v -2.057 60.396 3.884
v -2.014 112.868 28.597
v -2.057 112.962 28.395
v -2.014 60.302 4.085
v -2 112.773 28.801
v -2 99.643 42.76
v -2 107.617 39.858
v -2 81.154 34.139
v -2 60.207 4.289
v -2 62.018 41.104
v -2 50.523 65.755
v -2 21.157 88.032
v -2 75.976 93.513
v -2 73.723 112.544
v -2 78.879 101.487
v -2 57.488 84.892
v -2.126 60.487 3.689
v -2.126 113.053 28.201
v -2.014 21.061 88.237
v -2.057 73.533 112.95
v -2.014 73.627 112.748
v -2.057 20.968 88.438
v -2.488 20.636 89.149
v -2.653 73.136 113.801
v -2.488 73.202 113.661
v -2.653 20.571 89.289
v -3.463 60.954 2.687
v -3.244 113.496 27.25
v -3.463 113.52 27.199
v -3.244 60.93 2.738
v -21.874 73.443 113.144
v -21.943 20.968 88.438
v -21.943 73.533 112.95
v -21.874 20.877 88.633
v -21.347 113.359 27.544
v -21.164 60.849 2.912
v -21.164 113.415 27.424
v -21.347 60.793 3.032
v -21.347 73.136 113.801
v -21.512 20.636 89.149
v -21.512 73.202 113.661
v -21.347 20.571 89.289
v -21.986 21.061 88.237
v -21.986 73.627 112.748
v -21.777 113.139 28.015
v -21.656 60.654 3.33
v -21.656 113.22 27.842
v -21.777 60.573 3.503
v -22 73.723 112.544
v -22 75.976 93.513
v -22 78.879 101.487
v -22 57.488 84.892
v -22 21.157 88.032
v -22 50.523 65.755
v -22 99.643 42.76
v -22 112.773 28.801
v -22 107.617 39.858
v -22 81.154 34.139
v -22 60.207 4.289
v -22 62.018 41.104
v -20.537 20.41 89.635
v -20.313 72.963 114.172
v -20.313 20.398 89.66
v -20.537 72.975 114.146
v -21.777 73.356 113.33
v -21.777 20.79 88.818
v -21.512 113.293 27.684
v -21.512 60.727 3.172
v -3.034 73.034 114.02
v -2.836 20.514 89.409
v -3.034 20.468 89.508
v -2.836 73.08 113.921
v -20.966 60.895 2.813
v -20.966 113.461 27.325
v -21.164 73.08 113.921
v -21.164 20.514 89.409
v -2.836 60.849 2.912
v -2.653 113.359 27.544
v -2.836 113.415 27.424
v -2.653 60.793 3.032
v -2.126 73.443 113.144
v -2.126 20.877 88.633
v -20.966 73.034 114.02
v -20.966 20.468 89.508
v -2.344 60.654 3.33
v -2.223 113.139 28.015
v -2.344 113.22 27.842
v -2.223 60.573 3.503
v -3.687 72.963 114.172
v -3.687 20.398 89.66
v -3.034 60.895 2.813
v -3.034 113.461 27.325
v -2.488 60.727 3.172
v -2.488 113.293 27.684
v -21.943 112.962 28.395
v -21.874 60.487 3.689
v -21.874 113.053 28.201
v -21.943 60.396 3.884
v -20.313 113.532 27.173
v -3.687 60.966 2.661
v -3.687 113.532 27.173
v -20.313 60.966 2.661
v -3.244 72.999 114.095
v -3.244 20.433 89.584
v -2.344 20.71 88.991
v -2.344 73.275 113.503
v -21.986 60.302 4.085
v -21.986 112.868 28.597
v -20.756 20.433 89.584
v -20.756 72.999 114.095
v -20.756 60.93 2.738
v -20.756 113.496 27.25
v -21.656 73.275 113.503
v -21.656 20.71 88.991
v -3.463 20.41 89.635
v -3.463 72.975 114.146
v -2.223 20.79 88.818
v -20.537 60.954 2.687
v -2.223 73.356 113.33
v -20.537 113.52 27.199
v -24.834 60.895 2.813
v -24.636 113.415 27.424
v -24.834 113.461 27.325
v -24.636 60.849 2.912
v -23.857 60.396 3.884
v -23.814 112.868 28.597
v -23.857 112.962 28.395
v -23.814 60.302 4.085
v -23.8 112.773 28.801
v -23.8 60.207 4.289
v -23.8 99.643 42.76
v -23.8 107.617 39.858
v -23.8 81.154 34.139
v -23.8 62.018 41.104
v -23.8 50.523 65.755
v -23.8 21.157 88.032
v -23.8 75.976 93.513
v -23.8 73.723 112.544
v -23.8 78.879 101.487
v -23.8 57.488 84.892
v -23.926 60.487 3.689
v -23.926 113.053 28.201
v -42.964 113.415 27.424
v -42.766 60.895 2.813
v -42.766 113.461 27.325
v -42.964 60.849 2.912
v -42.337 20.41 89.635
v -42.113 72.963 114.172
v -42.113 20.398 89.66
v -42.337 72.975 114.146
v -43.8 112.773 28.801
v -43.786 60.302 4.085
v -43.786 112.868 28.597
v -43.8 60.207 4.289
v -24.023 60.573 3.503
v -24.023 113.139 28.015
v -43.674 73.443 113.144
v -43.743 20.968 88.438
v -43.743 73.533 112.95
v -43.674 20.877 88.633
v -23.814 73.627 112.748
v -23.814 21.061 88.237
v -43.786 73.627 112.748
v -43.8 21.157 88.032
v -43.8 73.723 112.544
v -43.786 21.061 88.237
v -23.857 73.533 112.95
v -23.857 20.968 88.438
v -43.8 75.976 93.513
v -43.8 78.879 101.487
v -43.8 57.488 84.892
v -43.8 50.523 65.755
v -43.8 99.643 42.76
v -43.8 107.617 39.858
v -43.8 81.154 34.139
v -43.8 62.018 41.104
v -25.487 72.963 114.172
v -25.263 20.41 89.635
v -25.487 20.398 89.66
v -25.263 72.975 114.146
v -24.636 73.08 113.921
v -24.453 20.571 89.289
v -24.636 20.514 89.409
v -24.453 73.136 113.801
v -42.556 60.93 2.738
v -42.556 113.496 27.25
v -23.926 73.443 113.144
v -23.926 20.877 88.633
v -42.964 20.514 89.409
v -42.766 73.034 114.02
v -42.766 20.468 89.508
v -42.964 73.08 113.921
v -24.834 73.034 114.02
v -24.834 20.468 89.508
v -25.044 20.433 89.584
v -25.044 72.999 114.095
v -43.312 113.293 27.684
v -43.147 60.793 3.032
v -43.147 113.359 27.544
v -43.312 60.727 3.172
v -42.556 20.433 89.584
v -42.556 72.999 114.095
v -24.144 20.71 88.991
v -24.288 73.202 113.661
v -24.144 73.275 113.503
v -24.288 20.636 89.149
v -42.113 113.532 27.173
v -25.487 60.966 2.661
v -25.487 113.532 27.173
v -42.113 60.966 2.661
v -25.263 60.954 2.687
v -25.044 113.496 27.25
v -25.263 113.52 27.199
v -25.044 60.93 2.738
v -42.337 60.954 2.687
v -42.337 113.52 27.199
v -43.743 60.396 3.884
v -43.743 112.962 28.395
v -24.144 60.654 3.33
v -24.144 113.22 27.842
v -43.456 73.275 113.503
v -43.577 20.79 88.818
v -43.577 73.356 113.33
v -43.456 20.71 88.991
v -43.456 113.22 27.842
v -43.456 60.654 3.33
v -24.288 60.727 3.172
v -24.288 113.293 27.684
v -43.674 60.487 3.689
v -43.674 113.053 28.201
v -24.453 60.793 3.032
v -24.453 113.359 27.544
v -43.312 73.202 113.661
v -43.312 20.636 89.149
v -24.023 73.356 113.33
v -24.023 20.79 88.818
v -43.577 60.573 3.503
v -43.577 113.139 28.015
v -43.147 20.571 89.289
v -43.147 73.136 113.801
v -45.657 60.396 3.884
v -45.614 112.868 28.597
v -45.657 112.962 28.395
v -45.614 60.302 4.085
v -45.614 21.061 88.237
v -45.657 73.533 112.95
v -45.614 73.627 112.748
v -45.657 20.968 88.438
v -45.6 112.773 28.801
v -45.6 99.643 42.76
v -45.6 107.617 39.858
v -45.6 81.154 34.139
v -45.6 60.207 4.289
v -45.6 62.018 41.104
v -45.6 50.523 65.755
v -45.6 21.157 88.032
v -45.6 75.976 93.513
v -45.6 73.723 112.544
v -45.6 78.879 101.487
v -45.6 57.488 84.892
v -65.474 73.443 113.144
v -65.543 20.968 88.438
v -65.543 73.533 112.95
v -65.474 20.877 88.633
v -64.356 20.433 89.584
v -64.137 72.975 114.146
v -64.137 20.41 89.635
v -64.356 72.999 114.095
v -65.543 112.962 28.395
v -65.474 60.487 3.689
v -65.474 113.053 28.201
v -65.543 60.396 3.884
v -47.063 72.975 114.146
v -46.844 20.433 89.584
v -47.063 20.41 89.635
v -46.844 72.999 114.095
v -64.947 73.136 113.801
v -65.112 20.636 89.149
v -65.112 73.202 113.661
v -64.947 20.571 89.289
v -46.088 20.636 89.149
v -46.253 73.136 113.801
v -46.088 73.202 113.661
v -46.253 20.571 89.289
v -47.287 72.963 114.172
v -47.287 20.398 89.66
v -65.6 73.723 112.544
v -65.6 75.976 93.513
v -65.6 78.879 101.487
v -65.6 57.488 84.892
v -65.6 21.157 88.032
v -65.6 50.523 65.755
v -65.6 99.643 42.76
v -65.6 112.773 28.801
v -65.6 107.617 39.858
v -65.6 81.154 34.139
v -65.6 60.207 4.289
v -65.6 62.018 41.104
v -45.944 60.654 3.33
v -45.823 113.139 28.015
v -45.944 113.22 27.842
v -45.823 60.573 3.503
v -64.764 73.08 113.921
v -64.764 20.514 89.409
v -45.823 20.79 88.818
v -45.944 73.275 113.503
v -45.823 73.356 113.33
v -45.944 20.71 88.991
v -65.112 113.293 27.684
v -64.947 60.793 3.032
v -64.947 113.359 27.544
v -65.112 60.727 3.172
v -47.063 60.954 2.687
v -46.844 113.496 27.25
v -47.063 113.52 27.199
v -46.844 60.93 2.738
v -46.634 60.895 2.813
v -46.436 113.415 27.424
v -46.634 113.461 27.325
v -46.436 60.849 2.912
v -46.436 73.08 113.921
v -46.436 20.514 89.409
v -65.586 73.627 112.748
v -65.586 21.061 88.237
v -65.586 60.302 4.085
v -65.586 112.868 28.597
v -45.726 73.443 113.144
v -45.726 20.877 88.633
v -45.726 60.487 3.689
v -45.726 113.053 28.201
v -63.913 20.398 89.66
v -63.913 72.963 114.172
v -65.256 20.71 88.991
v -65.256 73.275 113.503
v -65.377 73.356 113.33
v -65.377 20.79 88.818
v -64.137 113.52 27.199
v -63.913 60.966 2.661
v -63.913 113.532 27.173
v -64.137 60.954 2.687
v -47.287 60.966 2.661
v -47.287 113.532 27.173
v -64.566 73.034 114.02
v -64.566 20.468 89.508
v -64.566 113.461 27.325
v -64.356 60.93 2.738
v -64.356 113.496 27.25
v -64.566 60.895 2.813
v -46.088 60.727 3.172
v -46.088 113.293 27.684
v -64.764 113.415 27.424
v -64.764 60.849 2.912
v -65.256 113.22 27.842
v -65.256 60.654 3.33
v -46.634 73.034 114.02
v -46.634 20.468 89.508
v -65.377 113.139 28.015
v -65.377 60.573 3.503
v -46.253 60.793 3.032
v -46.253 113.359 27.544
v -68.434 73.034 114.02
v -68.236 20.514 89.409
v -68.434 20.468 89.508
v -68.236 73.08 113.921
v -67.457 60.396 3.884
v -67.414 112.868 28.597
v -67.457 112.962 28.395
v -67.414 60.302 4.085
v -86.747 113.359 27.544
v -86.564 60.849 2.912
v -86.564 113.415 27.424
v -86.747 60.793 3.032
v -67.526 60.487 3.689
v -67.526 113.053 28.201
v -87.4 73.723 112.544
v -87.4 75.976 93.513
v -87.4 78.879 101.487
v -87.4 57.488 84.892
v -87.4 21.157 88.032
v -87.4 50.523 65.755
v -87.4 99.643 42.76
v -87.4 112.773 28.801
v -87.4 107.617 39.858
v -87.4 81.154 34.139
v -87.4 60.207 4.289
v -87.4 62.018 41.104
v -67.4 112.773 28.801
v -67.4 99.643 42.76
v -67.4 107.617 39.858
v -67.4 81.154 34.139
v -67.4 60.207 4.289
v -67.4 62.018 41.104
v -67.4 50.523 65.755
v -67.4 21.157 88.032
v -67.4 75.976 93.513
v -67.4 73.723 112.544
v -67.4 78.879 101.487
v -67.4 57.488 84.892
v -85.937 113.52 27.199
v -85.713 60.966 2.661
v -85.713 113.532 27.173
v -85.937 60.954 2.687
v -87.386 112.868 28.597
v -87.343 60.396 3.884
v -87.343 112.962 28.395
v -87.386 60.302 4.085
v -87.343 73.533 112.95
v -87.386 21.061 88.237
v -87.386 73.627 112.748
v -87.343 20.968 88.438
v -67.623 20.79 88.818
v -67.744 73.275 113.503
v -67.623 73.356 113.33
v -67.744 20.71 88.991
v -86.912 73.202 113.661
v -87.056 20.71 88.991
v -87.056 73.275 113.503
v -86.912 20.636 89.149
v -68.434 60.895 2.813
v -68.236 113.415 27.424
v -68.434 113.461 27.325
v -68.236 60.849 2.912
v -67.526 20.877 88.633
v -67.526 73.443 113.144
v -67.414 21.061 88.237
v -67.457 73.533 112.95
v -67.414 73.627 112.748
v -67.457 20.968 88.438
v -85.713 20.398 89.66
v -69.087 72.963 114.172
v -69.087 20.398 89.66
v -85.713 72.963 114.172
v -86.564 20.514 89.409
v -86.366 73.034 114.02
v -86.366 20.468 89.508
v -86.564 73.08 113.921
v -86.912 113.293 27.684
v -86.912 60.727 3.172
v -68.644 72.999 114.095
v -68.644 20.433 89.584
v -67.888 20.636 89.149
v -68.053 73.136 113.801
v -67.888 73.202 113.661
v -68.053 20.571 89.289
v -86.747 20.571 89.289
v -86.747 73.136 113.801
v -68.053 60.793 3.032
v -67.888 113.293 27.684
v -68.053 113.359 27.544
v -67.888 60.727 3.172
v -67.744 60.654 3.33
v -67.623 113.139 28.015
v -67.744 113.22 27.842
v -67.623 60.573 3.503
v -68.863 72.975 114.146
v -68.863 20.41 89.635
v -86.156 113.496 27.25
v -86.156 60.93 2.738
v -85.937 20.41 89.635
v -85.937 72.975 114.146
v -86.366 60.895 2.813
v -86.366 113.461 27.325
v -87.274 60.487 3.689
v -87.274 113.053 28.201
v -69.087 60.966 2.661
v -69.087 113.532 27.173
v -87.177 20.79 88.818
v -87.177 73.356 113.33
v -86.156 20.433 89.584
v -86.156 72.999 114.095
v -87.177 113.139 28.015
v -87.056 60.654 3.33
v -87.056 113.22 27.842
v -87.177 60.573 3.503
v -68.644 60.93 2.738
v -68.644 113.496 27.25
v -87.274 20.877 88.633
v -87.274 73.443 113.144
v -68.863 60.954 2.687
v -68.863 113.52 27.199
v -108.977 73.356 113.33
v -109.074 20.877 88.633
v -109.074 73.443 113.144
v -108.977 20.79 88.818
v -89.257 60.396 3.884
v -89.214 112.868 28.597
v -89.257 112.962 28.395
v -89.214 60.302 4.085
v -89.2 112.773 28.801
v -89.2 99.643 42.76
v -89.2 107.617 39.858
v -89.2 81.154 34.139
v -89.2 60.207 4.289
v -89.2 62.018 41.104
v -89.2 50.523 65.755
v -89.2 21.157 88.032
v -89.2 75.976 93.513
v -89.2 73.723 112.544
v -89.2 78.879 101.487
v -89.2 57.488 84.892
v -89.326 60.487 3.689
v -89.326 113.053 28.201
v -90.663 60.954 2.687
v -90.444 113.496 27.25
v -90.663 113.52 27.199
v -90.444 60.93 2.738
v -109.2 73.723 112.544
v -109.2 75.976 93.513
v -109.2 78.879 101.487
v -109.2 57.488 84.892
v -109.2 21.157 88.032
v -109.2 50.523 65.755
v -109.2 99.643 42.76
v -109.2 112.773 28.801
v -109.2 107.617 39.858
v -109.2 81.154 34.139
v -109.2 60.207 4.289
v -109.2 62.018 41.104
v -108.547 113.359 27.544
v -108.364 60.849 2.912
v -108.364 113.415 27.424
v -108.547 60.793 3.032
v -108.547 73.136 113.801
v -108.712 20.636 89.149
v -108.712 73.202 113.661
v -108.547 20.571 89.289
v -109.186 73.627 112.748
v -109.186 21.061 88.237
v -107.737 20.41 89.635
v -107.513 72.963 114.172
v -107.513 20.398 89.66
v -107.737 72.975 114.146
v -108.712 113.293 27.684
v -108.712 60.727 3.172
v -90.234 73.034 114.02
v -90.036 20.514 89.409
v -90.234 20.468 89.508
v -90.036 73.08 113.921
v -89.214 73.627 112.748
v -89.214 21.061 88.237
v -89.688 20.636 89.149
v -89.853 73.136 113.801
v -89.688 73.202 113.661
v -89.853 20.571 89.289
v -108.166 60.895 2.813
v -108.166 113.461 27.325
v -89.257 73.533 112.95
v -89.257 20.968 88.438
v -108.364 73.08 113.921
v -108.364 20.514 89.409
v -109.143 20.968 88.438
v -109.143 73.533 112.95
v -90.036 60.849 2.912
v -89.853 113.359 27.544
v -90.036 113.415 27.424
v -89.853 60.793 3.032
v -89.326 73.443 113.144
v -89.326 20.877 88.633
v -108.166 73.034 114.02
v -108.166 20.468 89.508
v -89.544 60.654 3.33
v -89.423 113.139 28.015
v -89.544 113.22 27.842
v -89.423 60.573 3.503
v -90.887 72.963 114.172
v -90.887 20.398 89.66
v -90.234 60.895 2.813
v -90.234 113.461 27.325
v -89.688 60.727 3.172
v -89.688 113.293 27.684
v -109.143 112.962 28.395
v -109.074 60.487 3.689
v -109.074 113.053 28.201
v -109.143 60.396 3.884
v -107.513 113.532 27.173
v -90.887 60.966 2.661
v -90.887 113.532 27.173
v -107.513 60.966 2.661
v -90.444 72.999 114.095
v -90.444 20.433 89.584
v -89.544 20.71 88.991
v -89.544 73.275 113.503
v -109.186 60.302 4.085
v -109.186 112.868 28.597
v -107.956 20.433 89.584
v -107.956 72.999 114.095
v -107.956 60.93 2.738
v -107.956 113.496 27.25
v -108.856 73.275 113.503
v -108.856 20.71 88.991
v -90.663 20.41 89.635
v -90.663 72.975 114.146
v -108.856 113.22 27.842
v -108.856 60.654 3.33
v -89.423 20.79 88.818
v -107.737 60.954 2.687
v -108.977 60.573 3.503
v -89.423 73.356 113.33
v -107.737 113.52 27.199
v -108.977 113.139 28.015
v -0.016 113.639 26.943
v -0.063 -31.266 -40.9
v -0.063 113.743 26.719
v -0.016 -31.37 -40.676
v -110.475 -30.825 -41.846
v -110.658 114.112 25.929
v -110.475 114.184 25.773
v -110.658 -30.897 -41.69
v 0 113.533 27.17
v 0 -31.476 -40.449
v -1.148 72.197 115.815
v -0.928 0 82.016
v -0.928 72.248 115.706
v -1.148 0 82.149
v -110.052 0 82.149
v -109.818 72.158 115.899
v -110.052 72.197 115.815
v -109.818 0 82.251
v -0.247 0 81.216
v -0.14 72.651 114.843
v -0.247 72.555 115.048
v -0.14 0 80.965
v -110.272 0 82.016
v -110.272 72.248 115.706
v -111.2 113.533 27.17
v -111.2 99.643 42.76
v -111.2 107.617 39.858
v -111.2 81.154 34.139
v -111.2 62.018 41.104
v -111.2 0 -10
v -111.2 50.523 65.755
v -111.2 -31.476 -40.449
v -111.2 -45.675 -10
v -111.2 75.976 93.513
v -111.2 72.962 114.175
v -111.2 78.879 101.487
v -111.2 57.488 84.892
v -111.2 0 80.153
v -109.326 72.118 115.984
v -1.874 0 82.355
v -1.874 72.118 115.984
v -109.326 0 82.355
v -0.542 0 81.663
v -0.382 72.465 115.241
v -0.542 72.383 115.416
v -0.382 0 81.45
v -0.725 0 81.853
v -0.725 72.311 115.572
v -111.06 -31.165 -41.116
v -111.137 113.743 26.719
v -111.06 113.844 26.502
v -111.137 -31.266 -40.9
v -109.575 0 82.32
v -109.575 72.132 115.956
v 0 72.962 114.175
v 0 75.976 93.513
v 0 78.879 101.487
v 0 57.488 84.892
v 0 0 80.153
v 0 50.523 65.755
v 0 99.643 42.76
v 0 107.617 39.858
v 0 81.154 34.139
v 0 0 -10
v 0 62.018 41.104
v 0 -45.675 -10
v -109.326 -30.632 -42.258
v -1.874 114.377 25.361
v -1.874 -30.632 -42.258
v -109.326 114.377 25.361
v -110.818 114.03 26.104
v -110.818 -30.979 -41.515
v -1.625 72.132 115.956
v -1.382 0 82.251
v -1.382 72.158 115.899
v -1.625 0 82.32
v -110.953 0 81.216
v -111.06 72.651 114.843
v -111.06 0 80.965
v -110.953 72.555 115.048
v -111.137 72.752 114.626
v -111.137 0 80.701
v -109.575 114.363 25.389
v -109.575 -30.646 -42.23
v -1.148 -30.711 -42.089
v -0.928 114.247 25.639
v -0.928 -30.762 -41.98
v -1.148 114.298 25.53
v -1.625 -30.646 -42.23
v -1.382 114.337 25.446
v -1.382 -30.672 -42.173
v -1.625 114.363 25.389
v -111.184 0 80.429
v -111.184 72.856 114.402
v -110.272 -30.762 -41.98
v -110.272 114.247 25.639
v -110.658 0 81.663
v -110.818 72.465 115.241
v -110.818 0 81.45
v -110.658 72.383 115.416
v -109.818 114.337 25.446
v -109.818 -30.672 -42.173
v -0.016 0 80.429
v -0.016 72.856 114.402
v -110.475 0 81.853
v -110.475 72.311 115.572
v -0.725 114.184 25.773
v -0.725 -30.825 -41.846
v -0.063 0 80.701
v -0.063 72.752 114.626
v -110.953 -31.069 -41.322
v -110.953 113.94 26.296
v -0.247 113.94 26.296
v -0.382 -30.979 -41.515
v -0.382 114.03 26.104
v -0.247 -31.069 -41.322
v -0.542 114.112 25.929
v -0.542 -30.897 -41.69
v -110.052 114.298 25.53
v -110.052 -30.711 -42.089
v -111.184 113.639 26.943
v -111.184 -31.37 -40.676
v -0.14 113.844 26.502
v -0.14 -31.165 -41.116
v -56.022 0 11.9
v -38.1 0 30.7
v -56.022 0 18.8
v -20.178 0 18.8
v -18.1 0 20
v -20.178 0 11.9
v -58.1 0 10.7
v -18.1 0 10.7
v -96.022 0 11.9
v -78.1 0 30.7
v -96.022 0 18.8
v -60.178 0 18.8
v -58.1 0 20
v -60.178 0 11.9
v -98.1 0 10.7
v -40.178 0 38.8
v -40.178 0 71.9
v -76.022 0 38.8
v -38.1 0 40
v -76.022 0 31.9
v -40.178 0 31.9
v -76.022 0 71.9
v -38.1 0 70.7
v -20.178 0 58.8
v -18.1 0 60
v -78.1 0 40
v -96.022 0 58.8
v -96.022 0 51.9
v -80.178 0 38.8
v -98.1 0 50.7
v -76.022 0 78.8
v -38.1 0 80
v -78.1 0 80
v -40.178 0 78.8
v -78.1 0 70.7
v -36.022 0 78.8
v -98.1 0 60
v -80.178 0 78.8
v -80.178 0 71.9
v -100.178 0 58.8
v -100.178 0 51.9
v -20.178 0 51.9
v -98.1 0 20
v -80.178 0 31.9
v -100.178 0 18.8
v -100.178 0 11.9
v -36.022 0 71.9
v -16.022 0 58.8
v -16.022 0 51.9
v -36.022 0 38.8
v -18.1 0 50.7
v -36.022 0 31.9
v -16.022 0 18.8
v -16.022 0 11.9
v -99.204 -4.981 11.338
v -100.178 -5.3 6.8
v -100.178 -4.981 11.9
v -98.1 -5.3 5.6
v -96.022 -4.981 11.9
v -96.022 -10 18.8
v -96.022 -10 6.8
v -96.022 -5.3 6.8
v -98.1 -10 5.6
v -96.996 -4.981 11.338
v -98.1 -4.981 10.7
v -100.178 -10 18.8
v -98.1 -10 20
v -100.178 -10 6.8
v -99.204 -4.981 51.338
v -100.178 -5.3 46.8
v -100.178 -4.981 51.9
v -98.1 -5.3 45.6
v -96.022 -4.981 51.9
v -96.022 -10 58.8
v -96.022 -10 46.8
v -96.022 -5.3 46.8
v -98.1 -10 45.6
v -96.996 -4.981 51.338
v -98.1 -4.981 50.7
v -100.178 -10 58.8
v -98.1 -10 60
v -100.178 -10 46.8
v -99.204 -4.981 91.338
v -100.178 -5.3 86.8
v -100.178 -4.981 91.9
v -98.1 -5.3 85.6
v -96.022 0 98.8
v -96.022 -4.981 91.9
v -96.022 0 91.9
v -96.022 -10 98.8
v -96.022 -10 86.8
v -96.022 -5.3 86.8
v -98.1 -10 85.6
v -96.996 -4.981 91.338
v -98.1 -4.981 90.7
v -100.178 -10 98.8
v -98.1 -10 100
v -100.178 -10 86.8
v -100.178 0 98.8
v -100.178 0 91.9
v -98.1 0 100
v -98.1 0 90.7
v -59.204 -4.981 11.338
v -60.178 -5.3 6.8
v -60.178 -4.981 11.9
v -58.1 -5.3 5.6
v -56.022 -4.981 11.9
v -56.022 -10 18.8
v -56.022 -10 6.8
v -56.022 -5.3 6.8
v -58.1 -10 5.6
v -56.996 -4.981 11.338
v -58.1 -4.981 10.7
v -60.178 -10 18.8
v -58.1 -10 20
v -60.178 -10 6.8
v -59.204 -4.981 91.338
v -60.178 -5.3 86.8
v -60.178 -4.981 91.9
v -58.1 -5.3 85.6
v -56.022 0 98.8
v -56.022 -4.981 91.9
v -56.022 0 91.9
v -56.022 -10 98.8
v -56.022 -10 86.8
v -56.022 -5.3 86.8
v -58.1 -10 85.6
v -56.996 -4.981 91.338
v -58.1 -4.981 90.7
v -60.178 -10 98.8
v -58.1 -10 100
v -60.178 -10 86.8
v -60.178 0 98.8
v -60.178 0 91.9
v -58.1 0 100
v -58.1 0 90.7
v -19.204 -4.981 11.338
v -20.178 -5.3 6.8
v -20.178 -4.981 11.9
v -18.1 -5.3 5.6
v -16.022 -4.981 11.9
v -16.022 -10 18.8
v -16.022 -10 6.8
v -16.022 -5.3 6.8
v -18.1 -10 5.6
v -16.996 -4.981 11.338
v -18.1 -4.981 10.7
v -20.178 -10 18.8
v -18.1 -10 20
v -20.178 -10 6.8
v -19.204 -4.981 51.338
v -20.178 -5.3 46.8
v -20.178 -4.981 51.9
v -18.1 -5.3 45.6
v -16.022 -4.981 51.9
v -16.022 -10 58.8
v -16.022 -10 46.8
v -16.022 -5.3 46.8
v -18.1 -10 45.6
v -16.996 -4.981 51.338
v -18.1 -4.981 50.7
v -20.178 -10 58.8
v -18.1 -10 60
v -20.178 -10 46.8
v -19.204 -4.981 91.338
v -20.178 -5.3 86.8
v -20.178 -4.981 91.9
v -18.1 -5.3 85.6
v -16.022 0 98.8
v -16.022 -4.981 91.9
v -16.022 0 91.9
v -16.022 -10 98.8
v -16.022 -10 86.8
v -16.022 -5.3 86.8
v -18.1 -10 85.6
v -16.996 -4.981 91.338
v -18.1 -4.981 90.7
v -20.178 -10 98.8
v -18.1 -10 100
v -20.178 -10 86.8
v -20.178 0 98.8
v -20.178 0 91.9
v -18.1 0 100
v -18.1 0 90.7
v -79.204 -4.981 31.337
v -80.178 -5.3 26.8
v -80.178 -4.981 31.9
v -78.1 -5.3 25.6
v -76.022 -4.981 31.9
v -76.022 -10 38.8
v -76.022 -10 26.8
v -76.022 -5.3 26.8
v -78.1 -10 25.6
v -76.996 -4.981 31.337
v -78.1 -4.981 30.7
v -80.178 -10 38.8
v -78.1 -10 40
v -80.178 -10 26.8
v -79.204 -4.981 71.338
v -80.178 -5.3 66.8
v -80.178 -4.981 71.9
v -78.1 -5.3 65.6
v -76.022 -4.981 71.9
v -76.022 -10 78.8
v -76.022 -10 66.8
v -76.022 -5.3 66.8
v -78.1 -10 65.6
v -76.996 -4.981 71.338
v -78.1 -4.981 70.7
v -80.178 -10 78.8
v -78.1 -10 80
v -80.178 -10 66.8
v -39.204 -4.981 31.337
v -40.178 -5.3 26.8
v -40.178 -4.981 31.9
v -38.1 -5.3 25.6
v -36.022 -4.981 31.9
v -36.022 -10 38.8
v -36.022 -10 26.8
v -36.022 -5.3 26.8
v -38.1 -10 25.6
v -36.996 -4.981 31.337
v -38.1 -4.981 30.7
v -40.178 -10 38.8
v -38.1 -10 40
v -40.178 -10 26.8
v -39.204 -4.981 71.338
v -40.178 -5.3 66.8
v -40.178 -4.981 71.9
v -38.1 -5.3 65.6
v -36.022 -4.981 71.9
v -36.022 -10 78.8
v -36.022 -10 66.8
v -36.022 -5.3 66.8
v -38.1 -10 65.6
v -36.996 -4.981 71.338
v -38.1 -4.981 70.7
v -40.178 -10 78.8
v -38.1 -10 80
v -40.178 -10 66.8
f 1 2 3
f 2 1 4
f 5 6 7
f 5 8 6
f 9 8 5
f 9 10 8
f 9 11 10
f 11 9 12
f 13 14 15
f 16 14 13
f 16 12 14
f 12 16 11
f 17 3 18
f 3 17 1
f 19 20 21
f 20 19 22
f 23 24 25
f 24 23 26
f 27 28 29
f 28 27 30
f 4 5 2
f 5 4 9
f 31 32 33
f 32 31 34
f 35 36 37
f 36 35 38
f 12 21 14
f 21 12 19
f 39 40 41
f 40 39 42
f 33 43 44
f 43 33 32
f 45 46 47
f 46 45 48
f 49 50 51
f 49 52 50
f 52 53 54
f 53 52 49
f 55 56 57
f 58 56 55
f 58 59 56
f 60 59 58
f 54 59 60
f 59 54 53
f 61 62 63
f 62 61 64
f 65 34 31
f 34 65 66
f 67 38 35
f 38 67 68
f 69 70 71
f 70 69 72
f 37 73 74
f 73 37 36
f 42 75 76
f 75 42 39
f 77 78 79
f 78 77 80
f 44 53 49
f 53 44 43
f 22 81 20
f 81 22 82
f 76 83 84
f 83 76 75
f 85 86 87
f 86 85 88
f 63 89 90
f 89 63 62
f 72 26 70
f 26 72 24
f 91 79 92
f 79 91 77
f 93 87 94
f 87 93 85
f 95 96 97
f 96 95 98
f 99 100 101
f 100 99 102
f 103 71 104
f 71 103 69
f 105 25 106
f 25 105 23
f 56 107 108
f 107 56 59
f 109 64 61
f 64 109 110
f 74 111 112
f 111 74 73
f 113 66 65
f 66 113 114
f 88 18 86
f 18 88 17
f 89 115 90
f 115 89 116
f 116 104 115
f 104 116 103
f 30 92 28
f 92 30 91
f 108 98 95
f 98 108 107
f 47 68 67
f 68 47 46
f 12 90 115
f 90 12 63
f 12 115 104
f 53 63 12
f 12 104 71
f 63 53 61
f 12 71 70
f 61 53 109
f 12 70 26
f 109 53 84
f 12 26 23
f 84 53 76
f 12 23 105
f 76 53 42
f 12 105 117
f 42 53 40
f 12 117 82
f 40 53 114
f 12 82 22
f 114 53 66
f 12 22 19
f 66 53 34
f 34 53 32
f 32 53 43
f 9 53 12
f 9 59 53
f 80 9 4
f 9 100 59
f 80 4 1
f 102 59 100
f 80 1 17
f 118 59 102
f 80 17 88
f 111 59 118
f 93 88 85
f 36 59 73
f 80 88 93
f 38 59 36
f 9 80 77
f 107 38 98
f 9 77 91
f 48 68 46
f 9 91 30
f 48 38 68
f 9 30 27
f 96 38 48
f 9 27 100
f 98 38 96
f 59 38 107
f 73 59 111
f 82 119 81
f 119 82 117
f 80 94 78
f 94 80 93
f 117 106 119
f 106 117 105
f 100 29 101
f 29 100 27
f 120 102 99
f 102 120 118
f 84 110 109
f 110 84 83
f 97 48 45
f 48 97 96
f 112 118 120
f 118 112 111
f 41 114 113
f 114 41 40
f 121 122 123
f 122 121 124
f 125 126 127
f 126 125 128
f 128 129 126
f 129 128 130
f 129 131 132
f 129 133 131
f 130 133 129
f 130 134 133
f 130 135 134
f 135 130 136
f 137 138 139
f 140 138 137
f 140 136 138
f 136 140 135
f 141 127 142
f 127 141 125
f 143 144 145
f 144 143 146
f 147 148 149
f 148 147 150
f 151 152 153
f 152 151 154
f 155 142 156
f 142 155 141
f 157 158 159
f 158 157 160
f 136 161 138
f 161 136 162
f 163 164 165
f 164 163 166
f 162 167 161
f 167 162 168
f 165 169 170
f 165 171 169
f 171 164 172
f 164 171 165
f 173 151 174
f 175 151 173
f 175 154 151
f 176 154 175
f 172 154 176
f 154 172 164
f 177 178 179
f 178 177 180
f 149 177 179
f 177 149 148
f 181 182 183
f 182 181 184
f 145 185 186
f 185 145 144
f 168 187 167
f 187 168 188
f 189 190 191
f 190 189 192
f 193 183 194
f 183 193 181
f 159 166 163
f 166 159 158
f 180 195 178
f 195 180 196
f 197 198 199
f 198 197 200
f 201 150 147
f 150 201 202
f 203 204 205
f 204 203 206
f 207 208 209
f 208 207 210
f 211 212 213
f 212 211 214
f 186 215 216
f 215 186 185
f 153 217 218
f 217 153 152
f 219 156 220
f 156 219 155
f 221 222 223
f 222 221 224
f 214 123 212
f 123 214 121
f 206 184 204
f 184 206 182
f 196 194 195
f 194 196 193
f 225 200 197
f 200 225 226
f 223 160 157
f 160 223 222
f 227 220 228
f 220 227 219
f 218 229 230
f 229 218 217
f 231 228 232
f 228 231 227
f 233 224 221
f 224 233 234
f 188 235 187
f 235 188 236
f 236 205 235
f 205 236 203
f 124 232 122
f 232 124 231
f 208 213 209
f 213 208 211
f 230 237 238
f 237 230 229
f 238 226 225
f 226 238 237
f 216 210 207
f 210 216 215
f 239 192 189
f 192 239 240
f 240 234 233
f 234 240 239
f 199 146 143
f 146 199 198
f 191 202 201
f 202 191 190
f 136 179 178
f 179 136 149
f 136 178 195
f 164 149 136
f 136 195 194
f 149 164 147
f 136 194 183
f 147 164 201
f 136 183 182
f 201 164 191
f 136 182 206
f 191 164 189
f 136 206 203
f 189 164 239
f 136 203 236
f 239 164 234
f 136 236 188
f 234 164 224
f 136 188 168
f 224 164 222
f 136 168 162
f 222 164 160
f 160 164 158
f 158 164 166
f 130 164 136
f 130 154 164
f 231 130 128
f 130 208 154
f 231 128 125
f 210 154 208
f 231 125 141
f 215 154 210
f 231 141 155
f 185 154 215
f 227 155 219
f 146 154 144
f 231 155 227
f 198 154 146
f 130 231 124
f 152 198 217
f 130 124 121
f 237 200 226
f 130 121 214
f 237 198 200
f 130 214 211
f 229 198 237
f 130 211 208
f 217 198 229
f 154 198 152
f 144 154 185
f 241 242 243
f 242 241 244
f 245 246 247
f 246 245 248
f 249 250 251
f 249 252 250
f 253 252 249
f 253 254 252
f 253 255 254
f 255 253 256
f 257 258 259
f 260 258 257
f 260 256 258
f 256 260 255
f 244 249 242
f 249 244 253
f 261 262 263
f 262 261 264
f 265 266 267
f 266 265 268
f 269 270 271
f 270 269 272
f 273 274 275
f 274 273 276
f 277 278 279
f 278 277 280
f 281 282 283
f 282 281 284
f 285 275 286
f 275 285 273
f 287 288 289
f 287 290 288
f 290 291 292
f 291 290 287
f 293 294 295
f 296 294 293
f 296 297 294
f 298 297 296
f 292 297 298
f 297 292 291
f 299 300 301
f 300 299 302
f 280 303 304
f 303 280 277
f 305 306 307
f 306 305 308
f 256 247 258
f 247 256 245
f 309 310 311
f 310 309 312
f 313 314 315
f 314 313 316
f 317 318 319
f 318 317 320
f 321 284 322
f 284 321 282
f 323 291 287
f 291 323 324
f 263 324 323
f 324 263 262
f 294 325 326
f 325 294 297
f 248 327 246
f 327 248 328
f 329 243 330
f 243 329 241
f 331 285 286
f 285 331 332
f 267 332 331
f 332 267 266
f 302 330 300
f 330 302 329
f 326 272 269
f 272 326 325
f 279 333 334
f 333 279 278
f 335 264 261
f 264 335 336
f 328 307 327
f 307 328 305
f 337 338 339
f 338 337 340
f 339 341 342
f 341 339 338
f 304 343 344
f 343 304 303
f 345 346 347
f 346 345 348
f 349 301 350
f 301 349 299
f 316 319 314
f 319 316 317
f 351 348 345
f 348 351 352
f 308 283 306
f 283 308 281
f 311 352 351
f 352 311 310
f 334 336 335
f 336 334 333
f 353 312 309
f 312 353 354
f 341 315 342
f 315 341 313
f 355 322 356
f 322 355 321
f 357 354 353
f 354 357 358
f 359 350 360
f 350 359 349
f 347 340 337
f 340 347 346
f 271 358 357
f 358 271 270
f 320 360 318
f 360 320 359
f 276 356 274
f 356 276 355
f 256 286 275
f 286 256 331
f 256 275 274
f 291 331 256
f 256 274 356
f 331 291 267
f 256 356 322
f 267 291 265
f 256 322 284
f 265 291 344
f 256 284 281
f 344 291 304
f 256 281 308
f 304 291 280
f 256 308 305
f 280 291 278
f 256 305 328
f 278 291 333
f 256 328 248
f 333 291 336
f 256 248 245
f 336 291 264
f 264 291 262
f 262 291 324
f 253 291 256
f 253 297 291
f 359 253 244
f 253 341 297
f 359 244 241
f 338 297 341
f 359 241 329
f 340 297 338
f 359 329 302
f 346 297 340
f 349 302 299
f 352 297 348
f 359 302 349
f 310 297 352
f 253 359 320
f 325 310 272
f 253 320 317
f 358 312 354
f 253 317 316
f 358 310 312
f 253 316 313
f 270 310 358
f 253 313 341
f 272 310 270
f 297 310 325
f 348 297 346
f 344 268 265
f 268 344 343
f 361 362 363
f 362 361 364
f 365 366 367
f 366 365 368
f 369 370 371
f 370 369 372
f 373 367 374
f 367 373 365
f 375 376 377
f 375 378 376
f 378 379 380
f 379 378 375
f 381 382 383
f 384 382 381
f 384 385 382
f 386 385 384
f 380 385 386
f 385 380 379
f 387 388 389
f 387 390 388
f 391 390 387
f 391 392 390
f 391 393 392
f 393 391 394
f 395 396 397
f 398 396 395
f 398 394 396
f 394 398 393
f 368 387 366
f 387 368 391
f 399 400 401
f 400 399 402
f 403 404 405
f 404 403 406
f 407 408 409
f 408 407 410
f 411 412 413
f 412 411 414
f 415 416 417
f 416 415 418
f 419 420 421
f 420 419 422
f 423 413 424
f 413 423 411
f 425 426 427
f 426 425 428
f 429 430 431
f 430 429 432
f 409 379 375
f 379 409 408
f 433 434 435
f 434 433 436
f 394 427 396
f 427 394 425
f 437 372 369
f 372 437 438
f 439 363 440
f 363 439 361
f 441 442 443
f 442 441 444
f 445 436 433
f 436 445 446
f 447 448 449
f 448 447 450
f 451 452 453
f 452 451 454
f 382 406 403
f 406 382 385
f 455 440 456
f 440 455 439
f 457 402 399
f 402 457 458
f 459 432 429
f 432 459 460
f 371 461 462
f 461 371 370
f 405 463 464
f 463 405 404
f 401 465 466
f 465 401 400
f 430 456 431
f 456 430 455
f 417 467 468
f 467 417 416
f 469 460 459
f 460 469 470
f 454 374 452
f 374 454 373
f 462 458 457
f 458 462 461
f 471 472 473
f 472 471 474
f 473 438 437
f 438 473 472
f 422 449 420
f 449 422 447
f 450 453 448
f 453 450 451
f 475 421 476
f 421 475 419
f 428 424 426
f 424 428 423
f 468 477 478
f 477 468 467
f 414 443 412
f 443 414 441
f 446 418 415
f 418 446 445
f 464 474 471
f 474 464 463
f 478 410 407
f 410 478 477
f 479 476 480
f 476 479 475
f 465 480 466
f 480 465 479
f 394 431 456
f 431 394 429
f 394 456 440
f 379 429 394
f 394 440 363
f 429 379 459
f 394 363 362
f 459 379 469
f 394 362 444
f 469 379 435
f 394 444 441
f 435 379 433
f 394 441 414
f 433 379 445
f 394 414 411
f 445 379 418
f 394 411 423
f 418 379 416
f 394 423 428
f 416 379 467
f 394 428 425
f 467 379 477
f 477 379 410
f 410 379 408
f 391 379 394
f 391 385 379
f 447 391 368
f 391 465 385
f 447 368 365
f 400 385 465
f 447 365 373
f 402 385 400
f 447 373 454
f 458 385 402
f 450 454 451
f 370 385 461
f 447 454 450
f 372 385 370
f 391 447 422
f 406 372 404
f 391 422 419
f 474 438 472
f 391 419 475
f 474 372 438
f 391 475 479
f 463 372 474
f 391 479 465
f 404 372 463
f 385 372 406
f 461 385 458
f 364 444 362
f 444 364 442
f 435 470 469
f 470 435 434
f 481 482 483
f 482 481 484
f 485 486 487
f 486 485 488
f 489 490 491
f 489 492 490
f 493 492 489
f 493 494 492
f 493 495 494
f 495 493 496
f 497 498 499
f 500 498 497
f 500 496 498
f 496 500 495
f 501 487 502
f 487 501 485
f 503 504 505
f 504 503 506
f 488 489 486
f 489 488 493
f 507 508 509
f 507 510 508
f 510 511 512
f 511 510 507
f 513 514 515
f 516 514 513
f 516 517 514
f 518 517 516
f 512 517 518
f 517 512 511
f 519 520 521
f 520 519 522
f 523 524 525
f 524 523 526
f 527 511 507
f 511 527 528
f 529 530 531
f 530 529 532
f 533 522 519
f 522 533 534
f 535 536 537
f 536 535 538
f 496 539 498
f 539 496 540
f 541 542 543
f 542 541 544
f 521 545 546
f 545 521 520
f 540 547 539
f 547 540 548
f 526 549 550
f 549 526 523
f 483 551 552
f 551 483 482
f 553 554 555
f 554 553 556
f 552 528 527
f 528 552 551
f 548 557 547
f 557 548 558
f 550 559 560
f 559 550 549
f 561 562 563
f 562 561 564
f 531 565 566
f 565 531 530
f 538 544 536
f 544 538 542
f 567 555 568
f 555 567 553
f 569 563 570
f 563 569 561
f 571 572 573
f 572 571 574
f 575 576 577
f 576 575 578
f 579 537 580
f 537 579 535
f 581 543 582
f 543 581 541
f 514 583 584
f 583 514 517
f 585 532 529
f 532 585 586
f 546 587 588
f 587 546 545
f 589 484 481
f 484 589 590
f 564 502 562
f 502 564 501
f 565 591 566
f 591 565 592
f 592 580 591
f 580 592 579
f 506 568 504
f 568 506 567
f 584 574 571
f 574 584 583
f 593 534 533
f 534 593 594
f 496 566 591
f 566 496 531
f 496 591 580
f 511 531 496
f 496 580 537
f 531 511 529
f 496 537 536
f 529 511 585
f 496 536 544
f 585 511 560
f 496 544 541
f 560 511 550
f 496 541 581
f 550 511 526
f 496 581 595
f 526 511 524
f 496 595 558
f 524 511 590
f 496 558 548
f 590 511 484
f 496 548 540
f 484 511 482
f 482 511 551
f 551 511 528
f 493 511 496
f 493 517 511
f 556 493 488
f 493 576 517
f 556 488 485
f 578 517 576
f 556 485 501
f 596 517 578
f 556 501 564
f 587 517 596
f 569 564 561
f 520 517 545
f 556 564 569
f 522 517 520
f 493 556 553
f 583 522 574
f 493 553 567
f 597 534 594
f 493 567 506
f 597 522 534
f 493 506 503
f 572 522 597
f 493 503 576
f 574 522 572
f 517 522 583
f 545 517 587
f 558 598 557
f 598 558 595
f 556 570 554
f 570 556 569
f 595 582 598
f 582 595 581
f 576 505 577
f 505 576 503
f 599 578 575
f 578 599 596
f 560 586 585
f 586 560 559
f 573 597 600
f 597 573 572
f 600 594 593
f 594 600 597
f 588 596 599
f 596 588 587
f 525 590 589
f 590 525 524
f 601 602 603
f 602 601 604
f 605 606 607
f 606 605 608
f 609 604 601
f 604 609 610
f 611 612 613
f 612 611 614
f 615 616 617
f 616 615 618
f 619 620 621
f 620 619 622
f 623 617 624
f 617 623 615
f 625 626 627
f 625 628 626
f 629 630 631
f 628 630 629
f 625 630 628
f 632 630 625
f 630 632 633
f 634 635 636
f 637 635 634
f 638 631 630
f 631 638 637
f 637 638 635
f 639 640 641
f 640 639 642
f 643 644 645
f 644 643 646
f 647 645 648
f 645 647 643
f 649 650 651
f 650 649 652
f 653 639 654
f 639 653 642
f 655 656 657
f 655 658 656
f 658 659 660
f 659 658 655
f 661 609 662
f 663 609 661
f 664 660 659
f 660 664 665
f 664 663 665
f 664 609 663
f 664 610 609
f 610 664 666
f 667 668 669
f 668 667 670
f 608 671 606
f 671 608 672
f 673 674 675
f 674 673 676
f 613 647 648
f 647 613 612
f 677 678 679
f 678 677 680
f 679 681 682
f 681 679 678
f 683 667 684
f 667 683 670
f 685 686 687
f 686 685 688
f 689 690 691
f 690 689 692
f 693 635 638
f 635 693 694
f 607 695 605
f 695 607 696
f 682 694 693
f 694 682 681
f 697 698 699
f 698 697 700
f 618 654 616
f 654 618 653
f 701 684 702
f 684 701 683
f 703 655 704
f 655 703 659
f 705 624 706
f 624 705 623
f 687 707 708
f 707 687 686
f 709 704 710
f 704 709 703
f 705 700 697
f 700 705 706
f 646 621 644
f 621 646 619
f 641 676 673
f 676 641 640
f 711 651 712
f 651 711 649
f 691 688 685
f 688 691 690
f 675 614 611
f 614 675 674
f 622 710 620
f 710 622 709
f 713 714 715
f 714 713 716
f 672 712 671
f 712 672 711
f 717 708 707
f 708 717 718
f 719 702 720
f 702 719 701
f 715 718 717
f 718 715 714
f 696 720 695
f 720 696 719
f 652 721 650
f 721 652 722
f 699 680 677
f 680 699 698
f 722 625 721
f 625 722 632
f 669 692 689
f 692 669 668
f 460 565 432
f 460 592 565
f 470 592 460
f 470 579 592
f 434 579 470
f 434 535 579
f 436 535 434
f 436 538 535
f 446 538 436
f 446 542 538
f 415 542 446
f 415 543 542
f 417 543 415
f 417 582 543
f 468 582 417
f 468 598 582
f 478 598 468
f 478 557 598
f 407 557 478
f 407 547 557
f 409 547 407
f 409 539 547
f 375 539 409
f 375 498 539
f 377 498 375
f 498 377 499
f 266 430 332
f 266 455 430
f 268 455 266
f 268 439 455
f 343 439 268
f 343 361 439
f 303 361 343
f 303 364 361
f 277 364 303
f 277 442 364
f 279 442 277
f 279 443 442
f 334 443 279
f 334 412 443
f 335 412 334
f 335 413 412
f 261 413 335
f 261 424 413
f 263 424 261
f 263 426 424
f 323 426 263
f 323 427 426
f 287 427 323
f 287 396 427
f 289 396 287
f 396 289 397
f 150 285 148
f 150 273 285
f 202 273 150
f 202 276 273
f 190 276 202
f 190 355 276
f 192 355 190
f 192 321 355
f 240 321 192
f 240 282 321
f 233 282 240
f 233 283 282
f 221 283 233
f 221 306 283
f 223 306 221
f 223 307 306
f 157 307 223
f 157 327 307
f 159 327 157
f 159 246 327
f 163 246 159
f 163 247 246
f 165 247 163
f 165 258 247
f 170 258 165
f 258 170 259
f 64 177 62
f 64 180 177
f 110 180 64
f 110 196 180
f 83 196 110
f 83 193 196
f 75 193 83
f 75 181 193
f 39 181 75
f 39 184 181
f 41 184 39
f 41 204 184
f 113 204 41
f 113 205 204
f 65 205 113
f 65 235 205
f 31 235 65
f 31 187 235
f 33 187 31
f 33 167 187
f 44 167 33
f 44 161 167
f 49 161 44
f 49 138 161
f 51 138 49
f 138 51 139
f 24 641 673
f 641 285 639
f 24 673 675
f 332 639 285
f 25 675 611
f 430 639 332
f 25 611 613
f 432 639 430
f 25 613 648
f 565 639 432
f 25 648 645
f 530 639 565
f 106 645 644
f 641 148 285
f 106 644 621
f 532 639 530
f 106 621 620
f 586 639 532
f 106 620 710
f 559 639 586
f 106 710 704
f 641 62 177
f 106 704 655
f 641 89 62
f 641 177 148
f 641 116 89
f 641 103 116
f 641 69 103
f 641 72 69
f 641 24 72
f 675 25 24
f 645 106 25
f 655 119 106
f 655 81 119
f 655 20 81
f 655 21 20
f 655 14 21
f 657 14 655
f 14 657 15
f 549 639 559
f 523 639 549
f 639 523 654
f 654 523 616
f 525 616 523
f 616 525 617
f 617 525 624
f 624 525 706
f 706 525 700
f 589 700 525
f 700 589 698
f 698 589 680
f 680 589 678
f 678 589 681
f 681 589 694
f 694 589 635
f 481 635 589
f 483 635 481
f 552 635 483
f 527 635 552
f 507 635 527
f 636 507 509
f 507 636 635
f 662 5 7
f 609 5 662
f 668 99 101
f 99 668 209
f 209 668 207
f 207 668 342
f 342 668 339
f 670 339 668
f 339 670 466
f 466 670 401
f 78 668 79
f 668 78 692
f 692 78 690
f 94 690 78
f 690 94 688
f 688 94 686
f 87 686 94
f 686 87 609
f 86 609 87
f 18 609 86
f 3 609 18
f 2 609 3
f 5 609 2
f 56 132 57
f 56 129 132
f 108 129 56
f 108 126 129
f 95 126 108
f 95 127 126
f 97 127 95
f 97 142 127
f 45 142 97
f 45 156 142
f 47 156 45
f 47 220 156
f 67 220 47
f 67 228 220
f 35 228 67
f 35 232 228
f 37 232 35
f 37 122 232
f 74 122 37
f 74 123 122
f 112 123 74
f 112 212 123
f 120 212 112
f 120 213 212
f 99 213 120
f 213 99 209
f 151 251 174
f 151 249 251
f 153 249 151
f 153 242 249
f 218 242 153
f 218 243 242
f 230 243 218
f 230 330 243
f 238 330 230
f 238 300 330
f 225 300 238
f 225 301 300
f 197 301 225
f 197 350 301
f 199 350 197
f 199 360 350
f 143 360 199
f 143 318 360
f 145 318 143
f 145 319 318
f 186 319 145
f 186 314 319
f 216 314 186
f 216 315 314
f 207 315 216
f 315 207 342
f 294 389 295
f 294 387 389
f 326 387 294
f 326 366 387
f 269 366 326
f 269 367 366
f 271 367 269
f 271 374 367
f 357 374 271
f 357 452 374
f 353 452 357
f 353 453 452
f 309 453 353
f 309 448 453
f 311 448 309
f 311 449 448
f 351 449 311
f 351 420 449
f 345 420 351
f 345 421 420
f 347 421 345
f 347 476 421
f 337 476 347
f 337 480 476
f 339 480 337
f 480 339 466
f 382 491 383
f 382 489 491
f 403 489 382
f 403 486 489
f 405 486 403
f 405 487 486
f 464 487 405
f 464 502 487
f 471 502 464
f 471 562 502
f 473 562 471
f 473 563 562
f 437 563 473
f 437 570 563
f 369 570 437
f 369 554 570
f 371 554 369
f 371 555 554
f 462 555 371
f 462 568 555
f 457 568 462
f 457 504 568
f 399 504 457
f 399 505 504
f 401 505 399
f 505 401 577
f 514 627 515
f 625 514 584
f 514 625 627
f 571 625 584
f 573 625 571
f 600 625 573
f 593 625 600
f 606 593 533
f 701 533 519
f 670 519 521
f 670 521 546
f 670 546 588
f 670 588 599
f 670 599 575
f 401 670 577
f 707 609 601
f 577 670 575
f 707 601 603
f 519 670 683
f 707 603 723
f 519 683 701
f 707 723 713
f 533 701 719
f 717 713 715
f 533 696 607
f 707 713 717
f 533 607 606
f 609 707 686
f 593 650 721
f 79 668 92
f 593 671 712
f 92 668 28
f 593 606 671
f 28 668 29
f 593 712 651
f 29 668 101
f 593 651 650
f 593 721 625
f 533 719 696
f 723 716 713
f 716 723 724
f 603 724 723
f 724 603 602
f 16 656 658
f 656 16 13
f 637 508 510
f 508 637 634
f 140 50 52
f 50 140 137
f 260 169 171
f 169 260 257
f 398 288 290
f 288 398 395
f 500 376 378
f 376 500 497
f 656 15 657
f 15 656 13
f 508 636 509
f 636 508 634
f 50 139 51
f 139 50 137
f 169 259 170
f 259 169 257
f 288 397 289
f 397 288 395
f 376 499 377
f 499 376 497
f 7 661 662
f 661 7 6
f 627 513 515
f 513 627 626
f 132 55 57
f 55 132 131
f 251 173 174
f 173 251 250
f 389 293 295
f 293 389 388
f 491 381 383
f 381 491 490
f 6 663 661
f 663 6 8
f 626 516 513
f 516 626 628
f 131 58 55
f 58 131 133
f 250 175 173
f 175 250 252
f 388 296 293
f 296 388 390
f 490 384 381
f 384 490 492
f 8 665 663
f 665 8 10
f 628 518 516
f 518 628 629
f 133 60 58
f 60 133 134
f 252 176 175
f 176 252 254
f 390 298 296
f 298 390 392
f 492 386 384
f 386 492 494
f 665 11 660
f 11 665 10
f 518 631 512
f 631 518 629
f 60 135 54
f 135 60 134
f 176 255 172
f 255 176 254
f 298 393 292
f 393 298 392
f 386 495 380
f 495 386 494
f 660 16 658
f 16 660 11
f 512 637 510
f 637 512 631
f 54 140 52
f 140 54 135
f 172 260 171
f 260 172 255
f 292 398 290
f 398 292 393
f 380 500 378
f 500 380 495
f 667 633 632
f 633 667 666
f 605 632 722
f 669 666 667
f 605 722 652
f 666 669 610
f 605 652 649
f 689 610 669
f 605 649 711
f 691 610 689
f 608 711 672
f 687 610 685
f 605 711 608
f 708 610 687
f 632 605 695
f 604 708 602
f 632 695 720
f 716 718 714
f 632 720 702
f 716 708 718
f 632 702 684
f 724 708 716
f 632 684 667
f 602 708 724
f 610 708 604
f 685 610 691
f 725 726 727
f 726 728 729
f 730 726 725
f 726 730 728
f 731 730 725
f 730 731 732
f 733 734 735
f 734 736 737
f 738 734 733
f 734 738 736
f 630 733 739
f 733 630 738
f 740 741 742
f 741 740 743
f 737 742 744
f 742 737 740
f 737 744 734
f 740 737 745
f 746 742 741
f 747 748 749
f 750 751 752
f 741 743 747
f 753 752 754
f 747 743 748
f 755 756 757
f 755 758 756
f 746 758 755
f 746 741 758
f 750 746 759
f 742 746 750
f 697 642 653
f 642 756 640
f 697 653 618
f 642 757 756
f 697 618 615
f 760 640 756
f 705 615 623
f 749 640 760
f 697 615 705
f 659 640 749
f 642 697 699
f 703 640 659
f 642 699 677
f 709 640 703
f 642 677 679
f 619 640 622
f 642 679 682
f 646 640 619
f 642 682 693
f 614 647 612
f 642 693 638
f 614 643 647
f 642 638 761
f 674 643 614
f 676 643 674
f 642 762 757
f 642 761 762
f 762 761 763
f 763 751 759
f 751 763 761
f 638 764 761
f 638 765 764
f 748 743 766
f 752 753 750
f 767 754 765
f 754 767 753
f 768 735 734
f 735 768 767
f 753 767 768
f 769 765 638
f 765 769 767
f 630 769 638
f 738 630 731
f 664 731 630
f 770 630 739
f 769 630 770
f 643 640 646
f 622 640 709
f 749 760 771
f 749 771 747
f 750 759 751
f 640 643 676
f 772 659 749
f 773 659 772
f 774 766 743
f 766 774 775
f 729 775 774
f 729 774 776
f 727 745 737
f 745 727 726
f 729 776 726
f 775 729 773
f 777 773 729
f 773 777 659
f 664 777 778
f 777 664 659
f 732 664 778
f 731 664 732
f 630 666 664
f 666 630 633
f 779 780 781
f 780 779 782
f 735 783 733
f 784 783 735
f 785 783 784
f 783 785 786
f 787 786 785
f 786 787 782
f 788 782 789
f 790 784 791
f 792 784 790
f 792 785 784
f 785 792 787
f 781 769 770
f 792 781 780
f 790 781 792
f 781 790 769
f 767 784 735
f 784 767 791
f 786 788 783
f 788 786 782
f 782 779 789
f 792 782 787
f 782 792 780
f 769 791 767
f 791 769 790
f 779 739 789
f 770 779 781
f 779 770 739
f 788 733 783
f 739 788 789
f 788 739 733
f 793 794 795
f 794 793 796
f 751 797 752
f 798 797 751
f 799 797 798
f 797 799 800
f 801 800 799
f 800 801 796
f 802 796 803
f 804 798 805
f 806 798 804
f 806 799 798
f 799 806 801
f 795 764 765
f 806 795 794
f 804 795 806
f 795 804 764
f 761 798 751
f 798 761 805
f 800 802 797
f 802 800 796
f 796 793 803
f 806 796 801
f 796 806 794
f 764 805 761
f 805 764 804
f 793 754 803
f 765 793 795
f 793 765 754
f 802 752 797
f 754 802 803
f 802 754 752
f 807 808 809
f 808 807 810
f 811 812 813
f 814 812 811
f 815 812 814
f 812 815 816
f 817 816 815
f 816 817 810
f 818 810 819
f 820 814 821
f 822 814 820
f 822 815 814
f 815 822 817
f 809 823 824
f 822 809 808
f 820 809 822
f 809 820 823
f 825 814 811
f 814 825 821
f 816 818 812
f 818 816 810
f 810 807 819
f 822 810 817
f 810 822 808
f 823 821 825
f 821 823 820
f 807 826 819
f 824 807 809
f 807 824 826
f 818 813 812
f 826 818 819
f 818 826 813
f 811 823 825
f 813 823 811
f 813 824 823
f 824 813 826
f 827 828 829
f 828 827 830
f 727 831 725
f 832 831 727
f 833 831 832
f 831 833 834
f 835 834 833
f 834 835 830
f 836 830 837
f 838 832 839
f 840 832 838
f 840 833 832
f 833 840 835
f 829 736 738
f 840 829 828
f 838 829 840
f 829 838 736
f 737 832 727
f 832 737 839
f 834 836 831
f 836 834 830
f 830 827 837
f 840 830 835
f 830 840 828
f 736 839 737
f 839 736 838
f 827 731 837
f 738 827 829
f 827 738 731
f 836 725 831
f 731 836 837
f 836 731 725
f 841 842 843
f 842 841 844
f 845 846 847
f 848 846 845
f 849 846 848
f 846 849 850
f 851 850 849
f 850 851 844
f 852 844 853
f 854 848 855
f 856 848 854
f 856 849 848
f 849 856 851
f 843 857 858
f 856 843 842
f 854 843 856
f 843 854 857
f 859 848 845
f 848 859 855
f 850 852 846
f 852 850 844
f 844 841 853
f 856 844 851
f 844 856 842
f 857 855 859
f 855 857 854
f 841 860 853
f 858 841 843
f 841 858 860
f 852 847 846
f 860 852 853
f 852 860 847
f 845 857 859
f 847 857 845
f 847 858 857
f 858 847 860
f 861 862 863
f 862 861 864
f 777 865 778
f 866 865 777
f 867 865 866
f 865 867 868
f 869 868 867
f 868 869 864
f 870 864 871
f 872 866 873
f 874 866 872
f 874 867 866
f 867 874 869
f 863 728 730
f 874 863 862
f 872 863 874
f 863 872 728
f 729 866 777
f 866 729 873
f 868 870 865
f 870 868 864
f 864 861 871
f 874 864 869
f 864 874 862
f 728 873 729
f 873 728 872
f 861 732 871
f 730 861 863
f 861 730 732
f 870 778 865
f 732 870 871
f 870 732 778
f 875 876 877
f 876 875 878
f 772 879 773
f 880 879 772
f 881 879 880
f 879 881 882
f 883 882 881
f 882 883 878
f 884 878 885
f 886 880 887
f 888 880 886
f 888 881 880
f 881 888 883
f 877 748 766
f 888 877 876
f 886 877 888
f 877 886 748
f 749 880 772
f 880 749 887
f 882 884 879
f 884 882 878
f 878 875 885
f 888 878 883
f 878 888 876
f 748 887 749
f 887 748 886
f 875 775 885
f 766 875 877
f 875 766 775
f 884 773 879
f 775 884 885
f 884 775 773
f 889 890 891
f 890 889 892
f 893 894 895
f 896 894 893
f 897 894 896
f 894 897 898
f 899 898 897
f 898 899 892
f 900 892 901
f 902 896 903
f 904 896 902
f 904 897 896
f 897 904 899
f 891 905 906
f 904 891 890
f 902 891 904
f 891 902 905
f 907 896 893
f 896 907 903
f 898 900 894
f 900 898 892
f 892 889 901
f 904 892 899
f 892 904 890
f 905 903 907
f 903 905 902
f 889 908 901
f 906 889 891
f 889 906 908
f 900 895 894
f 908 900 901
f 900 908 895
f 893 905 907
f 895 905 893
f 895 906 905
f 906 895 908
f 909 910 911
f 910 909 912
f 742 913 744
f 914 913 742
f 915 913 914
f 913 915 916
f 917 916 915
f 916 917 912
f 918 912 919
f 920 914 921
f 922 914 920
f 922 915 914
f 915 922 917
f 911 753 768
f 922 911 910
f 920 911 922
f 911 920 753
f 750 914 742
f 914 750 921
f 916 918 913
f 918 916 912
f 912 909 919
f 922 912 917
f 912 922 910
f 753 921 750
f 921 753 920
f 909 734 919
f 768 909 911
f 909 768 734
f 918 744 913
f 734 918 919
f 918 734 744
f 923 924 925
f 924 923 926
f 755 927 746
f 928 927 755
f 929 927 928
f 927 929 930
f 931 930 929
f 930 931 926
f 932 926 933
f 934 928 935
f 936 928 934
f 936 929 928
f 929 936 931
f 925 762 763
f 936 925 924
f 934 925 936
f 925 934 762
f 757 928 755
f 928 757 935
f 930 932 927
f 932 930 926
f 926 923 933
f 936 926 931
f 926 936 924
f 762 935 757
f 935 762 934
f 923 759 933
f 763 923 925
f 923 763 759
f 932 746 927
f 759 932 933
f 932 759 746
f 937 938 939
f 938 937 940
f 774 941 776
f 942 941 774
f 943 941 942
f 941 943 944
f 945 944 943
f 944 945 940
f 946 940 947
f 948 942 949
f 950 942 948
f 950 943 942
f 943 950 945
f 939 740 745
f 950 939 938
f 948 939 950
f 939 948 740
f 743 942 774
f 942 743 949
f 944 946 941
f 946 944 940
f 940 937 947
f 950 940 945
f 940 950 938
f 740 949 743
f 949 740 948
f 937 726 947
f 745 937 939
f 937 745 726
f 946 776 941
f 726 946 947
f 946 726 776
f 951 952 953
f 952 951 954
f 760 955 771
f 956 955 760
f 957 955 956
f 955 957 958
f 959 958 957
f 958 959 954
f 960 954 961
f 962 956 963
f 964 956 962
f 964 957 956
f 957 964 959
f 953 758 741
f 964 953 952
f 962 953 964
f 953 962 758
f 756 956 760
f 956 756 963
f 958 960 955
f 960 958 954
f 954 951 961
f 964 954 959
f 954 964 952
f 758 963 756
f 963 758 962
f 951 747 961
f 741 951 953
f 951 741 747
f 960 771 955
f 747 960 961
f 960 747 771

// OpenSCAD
DEPTH = 100;
HEIGHT = 60;
WALL = 2;

SECTION_WIDTH = 20;
SECTION_QTY = 5;
SECTION_WALL = 1.8;

SKADIS = true;
ANGLE = 25;

$fn = 50;

ROUNDING = WALL;
WIDTH = WALL + (SECTION_WIDTH + SECTION_WALL) * SECTION_QTY + (WALL - SECTION_WALL);

if (SKADIS) {
  skadis();
} else {
  body();
}

module skadis() {
  angle_offset = cos(ANGLE) * HEIGHT;
  echo("angle_offset", angle_offset);
  rotate([90,0,180]) difference() {
    translate([0,0,HEIGHT]) rotate([-ANGLE,0,0]) union() {
      translate([0,0,-DEPTH]) rounded_body(DEPTH);
      body();
    }
    // Cut the bottom off
    #translate([-10,-10,-HEIGHT*4]) cube([WIDTH+20, DEPTH*2, HEIGHT*4]);
  }
  translate([-WIDTH,0,0]) hooks(WIDTH - 5, DEPTH);
}

module body() {
  difference() {
    rounded_body(HEIGHT);
    /*
        0   C      B                              A    
                                                      
         ──────────────────────────────────────────  G
         │ 5                                    6 │   
         │                                        │   
          \4                                   7//   F
           \\                                 //      
            │ 3                             8 │      E
            │                                 │       
            │                                 │       
            │\ 2                           9 /│      D
              \\                           //         
                \\                       //           
                  \\ 1             10  //             
                    \\───────────────//              0

        Edit/view: https://cascii.app/06c7c
    */
    A = DEPTH*0.68;
    B = A*0.3;
    C = 6;
    D = B-C;
    G = HEIGHT*0.68 + 1;
    E = G-1-C;
    F = G-1;
    translate([-1, (DEPTH-A)/2, HEIGHT - G + 1]) rotate([90,0,90]) linear_extrude(WIDTH+20) polygon([
      // Left
      [B,0], [C,D], [C,E], [0,F], [0,G], 
      //Right
      [A,G], [A,F], [A-C,E], [A-C,D], [A-B,0],
    ]);
    
    // Sections
    for (i=[0:1:SECTION_QTY-1]) {
      translate([WALL + i * (SECTION_WIDTH + SECTION_WALL), WALL, WALL])
          linear_extrude(HEIGHT) hull() {
            ROUNDING = SECTION_WALL;
            translate([ROUNDING, ROUNDING, 0]) circle(r=ROUNDING);
            translate([SECTION_WIDTH-ROUNDING, ROUNDING, 0]) circle(r=ROUNDING);
            translate([SECTION_WIDTH-ROUNDING, DEPTH-ROUNDING-2*WALL, 0]) circle(r=ROUNDING);
            translate([ROUNDING, DEPTH-ROUNDING-2*WALL, 0]) circle(r=ROUNDING);
          }
//        cube([SECTION_WIDTH, DEPTH - 2*WALL, HEIGHT]);
    }
  }
}

module rounded_body(h) {
  // Rounded main body
  linear_extrude(h) hull() {
    translate([ROUNDING, ROUNDING, 0]) circle(r=ROUNDING);
    translate([WIDTH-ROUNDING, ROUNDING, 0]) circle(r=ROUNDING);
    translate([WIDTH-ROUNDING, DEPTH-ROUNDING, 0]) circle(r=ROUNDING);
    translate([ROUNDING, DEPTH-ROUNDING, 0]) circle(r=ROUNDING);
  }  
}

module hooks(x, y, sparse=true) {
  cols = floor(x/40)+1;
  offsetX = (x - ((cols-1)*40)) / 2;  
  echo("cols", cols)
  echo("offsetX", offsetX);

  rows = floor(y/40)+1;
//  offsetY = (x - ((cols-1)*40)) / 2;  
//  echo("rows", rows)
//  echo("offsetY", offsetY);
  
  for (col = [0:1:cols-1]) {
    for (row = [0:1:rows-1]) {
      if (!sparse ||
          col == 0 || 
          col == cols-1 ||
          row == 0 ||
          row == rows-1) {
        translate([offsetX + col * 40, 0, 20 + row * 40]) hook();
      }
    }
  }
  
  for (col = [0:1:cols-2]) {
    for (row = [0:1:rows-2]) {
      if (!sparse ||
          col == 0 || 
          col == cols-2 ||
          row == 0 ||
          row == rows-2) {
        translate([20 + offsetX + col * 40, 0, 20 + 20 + row * 40]) hook();
      }
    }
  }

  
//  for (a = [offsetX + 20:40:x]) {
//    for (b = [40:40:y]) {
//      #translate([a,0,b]) hook();
//    }
//  }
}

module hook() {
  // t is the amount we reduce the width/height by to let it fit ok
  t = 0.1;
  // w = width
  w = 5;
  // wt is the width less the t
  wt = w - t * 2;
  // h is the hight less a bit to make it fit
  h = 15 - 0.3;
  // h2 is the height of the smaller part of the peg
  h2 = h - 5;
  // ht is the height less t
  ht = h - t;
  // d is the depth of the board
  d = 5;
  // 12 gives us enough facets to create a easy to print angle
  $fn = 6;

  translate([0, -d*2, -wt/2]) rotate([270, 90,0]) union() {
    // The larger part of the peg
    hull() {
      cylinder(d=wt, h=d + 0.3);
      // -0.3 is the taper applied to the face that makes contact with the back on the pegboard
      translate([ht-w, 0, 0]) cylinder(d=wt, h=d -0.3);
    }
    // The smaller part of the peg
    translate([0, 0, 0]) hull() {
      cylinder(d=wt, h = d * 2);
      translate([h2 - w - t * 2 ,0 ,0]) cylinder(d=wt, h=d * 2);
      };
  }
}
